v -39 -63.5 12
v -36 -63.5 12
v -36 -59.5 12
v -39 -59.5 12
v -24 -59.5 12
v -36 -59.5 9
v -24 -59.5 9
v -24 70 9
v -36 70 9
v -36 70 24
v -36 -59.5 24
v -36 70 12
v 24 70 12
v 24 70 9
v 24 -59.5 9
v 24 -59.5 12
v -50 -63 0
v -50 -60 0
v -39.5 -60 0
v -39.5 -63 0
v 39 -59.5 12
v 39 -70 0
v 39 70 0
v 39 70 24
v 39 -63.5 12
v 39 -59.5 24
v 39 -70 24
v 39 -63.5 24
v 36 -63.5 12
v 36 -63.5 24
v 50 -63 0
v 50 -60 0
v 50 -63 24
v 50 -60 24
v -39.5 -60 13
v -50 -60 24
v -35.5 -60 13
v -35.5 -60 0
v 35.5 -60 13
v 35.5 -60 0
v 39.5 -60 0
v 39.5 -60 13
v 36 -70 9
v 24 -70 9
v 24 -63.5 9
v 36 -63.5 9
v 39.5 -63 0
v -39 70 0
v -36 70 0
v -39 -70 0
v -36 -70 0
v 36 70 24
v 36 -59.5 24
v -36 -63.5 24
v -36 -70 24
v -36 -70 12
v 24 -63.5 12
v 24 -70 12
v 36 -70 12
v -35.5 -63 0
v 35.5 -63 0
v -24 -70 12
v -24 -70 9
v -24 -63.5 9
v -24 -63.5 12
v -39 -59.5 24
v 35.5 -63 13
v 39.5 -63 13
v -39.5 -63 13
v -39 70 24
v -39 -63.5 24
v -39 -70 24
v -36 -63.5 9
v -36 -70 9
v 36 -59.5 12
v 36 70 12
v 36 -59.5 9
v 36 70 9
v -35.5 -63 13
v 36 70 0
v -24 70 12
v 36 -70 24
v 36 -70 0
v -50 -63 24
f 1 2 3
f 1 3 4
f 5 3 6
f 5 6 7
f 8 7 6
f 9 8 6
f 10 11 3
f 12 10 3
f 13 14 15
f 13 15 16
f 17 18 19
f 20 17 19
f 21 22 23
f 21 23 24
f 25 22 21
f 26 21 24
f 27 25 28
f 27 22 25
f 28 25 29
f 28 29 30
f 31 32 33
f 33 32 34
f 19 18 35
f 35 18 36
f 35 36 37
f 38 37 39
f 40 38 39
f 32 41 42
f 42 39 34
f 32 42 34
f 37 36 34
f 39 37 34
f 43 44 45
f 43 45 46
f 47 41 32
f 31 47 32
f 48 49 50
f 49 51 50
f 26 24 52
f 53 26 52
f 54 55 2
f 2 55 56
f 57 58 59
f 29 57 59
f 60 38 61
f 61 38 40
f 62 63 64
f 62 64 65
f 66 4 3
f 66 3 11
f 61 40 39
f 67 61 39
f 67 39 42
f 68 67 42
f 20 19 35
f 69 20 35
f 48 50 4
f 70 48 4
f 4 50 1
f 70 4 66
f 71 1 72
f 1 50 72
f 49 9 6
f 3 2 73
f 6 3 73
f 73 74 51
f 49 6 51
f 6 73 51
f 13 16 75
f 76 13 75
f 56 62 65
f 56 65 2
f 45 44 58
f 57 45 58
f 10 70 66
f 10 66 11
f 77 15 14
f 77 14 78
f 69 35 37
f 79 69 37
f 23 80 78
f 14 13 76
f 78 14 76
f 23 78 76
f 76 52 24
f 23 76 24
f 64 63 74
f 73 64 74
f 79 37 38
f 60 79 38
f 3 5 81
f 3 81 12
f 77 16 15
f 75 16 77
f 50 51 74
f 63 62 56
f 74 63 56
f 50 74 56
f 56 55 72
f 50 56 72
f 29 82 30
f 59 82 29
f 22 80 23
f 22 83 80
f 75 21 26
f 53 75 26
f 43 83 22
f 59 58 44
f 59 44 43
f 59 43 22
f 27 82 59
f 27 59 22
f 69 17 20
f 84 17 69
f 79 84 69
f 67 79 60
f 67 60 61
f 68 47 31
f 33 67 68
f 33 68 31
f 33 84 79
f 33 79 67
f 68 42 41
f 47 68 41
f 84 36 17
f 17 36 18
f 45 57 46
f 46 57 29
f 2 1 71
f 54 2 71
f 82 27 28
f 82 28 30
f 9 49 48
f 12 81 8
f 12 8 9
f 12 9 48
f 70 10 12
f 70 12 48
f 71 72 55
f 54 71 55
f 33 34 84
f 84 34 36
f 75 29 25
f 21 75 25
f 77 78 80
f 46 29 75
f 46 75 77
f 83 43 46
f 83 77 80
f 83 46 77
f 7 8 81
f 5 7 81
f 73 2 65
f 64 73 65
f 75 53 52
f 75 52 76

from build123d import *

# Parameters (mm, degrees)
F0_W          = 12
F0_H          = 3
F1_DEPTH      = 70
F1_DEPTH_BACK = 70
F5_DEPTH      = 3
F6_W          = 4
F6_H          = 12
F7_DEPTH      = 3
F8_W          = 4
F8_H          = 12
F9_DEPTH      = 3
F10_W         = 12
F10_H         = 4
F11_DEPTH     = 3
F12_W         = 12
F12_H         = 4
F13_DEPTH     = 3


with BuildPart() as f1:
    # F0 (on Front) → F1 (new body, two sides)
    with BuildSketch(Plane.XZ) as f1_sk:
        Polygon((36, 9), (36, 0), (39, 0), (39, 24), (36, 24), (36, 12), align=None)
        with Locations((30, 10.5)):
            Rectangle(F0_W, F0_H)
    extrude(amount=F1_DEPTH)
    extrude(f1_sk.sketch, amount=-F1_DEPTH_BACK)


with BuildPart() as f2_1:
    # F2: instance of F1
    add(f1.part.mirror(Plane.YZ))

    # F8 (on face) → F9 (cut, through all)
    with BuildSketch(Plane(origin=(-39, 0, 0), x_dir=(0, -1, 0), z_dir=(-1, 0, 0))):
        with Locations((61.5, 18)):
            Rectangle(F8_W, F8_H)
    extrude(amount=-F9_DEPTH, mode=Mode.SUBTRACT)

    # F12 (on face) → F13 (cut, through all)
    with BuildSketch(Plane.XY.offset(12)):
        with Locations((-30, -61.5)):
            Rectangle(F12_W, F12_H)
    extrude(amount=-F13_DEPTH, mode=Mode.SUBTRACT)


with BuildPart() as f5:
    # F4 (on offset) → F5 (new body)
    with BuildSketch(Plane.XZ.offset(60)):
        Polygon((-50, 24), (-50, 0), (-39.5, 0), (-39.5, 13), (-35.5, 13), (-35.5, 0), (35.5, 0), (35.5, 13), (39.5, 13), (39.5, 0), (50, 0), (50, 24), align=None)
    extrude(amount=F5_DEPTH)


with BuildPart() as f1_1:
    add(f1.part)

    # F6 (on face) → F7 (cut, through all)
    with BuildSketch(Plane.YZ.offset(39)):
        with Locations((-61.5, 18)):
            Rectangle(F6_W, F6_H)
    extrude(amount=-F7_DEPTH, mode=Mode.SUBTRACT)

    # F10 (on face) → F11 (cut, through all)
    with BuildSketch(Plane.XY.offset(12)):
        with Locations((30, -61.5)):
            Rectangle(F10_W, F10_H)
    extrude(amount=-F11_DEPTH, mode=Mode.SUBTRACT)


solid = Compound([f2_1.part, f5.part, f1_1.part])
